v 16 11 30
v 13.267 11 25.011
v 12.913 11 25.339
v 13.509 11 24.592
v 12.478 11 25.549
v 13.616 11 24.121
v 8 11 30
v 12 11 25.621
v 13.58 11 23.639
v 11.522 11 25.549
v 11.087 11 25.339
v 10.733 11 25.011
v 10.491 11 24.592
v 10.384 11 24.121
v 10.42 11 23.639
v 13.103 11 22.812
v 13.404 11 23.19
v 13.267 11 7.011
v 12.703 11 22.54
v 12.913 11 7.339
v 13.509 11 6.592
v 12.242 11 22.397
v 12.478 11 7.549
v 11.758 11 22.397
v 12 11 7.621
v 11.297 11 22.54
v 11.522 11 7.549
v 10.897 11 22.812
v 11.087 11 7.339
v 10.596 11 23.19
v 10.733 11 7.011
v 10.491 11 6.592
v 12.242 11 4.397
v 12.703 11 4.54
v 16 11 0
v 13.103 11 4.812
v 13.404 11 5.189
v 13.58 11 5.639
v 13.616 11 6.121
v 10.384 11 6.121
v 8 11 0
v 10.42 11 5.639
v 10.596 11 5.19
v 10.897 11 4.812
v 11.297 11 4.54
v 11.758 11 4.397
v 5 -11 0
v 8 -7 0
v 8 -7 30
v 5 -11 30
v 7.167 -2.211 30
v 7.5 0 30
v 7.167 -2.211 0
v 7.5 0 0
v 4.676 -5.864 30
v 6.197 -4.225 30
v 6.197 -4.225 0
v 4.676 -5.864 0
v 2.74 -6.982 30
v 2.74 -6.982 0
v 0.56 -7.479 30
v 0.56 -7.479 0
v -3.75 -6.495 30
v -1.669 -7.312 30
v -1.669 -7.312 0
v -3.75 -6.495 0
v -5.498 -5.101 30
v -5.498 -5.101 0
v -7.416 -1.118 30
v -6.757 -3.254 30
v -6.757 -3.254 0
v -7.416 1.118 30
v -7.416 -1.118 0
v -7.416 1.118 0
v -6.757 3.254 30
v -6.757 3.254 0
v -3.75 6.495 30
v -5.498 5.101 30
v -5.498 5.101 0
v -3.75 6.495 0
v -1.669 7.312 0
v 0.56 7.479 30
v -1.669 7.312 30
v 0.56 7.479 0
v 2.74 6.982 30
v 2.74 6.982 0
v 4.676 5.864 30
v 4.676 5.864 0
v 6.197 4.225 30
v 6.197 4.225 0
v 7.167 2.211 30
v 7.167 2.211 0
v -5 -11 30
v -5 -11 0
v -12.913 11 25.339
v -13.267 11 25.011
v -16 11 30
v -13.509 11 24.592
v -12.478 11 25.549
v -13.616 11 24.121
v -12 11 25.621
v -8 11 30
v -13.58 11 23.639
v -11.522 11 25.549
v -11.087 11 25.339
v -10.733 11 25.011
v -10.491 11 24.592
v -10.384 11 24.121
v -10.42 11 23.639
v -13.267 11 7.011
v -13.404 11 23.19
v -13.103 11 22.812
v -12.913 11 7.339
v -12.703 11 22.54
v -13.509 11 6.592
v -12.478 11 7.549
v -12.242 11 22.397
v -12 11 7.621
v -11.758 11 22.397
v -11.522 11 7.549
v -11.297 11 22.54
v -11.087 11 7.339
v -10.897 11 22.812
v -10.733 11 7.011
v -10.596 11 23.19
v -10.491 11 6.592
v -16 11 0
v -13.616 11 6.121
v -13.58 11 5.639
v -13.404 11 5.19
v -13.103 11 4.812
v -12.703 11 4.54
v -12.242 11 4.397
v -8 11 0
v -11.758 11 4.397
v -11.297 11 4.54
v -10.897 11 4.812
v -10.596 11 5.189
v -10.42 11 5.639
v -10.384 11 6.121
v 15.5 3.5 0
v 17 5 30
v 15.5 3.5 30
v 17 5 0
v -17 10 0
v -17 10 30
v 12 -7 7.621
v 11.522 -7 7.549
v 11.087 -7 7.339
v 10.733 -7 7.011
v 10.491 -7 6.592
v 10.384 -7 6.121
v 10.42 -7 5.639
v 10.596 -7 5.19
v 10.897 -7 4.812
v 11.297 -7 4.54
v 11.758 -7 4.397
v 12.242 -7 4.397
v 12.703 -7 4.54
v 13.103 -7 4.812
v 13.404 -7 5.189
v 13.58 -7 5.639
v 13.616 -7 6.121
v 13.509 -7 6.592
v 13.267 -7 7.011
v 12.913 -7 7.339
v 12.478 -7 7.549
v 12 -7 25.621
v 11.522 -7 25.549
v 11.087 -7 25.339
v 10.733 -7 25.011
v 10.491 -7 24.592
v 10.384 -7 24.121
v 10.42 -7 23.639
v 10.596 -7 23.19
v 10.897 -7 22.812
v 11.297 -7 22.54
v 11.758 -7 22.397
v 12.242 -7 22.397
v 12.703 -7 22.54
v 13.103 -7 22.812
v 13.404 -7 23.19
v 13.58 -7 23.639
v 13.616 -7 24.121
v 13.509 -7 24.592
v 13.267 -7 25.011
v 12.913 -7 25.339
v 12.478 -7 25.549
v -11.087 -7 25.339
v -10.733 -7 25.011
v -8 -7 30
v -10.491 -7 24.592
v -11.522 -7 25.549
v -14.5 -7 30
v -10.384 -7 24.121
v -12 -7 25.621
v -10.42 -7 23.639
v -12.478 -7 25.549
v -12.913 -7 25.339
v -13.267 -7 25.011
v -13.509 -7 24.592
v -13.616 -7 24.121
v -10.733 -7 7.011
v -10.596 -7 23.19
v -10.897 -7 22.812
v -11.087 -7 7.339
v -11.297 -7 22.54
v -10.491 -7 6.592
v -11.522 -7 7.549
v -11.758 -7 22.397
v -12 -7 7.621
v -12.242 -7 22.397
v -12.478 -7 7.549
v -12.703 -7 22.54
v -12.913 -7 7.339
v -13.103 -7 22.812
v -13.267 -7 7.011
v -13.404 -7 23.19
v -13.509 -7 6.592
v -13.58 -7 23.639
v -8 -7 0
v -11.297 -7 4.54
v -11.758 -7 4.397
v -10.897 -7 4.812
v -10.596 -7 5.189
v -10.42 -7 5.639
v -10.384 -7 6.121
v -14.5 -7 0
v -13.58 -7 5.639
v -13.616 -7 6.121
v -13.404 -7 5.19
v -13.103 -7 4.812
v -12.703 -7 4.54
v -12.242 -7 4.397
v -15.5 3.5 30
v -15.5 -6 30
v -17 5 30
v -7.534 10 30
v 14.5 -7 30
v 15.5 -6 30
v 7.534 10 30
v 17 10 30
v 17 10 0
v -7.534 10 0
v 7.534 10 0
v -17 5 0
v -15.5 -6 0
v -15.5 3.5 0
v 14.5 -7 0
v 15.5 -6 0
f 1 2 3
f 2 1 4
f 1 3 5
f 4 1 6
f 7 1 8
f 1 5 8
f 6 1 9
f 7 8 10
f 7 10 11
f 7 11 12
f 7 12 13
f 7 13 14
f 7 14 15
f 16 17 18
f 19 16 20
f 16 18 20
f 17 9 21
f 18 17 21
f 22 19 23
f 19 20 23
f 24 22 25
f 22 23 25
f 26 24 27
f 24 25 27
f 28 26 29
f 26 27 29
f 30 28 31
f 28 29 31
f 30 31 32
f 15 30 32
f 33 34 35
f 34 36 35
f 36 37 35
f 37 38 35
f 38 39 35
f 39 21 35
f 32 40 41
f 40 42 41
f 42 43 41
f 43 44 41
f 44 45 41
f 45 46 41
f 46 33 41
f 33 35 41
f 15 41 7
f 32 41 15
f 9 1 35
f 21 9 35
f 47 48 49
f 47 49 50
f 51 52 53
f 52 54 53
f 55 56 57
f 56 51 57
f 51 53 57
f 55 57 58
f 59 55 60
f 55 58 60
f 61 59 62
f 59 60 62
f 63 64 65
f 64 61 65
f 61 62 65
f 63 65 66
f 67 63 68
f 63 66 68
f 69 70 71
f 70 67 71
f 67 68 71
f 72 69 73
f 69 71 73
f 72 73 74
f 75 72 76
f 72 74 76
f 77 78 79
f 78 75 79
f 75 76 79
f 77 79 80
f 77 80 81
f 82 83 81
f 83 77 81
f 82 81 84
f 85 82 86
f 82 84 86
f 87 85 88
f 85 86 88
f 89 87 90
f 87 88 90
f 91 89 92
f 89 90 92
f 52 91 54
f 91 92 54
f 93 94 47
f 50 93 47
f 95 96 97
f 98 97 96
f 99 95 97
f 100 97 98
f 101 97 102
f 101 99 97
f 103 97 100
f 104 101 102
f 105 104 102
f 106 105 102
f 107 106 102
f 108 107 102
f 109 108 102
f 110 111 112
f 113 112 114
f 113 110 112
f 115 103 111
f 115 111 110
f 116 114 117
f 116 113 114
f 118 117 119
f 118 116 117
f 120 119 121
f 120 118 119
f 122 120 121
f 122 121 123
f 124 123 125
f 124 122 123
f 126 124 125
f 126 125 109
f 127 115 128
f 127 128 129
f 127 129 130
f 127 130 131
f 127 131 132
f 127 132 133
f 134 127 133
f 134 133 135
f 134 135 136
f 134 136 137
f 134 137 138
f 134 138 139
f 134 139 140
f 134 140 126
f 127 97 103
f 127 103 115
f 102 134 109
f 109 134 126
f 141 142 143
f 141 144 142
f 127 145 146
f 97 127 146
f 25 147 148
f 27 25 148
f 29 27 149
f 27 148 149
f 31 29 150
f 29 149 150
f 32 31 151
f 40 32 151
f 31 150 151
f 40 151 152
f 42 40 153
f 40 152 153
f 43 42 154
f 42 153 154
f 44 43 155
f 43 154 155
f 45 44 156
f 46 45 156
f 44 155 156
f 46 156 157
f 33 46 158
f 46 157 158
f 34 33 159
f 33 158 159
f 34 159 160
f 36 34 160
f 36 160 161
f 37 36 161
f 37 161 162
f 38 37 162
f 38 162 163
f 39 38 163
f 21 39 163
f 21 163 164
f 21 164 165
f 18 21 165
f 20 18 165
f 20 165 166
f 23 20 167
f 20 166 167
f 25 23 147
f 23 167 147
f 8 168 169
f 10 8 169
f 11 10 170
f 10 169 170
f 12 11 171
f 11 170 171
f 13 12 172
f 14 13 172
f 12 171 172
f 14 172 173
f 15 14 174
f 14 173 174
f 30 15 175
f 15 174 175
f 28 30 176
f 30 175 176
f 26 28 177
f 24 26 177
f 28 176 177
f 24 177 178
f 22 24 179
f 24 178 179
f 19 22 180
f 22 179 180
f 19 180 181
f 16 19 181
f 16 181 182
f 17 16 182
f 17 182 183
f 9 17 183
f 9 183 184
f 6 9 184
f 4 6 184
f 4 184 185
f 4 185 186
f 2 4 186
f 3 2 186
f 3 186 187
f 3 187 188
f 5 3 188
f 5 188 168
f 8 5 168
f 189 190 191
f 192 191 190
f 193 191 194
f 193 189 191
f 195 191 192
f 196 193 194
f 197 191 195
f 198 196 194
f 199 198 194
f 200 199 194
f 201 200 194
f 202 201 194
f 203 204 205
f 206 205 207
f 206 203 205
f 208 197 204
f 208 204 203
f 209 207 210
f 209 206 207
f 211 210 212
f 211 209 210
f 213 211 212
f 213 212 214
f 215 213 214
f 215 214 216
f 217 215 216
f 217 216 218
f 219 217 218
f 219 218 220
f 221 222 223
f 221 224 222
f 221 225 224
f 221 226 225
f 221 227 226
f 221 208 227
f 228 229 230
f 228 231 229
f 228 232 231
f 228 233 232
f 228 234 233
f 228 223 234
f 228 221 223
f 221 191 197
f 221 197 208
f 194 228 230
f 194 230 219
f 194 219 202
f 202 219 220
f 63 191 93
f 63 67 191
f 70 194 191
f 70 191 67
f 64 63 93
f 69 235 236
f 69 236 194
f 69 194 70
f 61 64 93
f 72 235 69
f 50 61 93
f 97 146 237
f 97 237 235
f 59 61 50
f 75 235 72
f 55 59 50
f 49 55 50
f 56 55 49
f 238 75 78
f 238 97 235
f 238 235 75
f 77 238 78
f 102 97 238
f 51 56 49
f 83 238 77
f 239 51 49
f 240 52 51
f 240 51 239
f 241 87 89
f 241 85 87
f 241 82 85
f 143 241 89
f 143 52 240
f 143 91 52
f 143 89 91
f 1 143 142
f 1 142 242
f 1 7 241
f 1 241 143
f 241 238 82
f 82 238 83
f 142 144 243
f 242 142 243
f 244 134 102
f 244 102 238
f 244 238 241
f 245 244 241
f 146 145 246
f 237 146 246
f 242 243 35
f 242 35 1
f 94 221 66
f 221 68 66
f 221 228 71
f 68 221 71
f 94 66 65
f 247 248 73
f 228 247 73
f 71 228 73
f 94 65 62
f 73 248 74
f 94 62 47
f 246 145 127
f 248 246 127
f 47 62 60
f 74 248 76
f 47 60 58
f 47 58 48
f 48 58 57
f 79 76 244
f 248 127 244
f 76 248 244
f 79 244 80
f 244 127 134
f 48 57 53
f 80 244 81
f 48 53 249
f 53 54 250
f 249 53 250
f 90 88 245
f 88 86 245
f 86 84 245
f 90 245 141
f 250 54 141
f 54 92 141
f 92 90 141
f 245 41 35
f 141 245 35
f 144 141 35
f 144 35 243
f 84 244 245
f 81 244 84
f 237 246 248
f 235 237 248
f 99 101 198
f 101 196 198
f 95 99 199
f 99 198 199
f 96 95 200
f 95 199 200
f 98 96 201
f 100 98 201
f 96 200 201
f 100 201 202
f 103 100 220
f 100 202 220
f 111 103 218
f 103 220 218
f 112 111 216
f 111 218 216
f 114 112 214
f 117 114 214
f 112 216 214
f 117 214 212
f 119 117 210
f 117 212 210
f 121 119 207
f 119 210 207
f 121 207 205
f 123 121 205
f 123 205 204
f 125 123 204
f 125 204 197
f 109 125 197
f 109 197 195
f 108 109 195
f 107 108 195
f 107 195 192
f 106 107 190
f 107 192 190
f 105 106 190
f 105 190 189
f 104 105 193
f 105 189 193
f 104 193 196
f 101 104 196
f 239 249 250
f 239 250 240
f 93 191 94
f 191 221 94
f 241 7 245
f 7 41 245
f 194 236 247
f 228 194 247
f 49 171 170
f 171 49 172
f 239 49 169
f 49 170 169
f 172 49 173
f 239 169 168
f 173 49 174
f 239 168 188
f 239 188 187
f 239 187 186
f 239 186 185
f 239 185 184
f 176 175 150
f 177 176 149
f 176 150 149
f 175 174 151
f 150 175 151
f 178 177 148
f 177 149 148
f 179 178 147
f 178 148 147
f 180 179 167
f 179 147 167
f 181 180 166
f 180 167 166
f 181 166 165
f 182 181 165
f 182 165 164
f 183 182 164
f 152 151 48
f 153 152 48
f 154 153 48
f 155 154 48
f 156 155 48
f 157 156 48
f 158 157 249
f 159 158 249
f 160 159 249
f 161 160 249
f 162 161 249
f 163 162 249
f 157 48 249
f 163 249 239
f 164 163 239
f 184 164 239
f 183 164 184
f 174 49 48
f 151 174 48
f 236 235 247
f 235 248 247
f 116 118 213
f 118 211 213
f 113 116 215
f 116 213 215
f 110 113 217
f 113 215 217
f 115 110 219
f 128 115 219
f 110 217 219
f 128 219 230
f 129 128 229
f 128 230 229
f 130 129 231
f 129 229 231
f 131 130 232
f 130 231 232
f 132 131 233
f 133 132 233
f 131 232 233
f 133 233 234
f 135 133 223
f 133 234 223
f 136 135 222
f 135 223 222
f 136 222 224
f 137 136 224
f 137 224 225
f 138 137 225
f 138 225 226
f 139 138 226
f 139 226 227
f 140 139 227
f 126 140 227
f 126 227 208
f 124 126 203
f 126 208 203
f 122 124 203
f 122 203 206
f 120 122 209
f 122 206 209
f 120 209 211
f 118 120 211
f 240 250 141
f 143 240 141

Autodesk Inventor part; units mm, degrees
ref_plane "YZ Plane" through (0, 0, 0) normal (1, 0, 0) x (0, 1, 0)
ref_plane "XZ Plane" through (0, 0, 0) normal (0, 1, 0) x (-1, 0, 0)
ref_plane "XY Plane" through (0, 0, 0) normal (0, 0, 1) x (1, 0, 0)
sketch "Esboço1" plane through (0, 0, 0) normal (0, 0, 1) x (1, 0, 0)
  line L0 (-17, 11) -> (17, 11) construction
  line L1 (17, 11) -> (17, -7) construction
  line L2 (17, -7) -> (-17, -7) construction
  line L3 (-17, -7) -> (-17, 11) construction
  line L4 (-14, 20.4248) -> (-14, -25.3484) construction
  line L5 (14, 20.4248) -> (14, -25.3484) construction
  line L6 (0, 20.9223) -> (0, -24.8509) construction
  line L7 (-26.3196, 0) -> (26.3196, 0) construction
  line L8 (-26.3196, 5) -> (26.3196, 5) construction
  line L9 (-15.5, 15.1736) -> (-15.5, -30.5996) construction
  line L10 (15.5, 20.4248) -> (15.5, -25.3484) construction
  line L11 (0, 0) -> (-21.4941, -25.6157) construction
  line L12 (0, 0) -> (11.7474, -14) construction
  line L13 (-8, 20.4248) -> (-8, -25.3484) construction
  line L14 (-5, 20.4248) -> (-5, -25.3484) construction
  line L15 (5, 20.9223) -> (5, -24.8509) construction
  line L16 (8, 20.9223) -> (8, -24.8509) construction
  line L17 (-26.3196, 3.5) -> (26.3196, 3.5) construction
  line L18 (-17, 11) -> (-17, 5)
  line L19 (-17, 5) -> (-15.5, 3.5)
  line L20 (-15.5, 3.5) -> (-15.5, -7)
  line L21 (17, 5) -> (17, 11)
  line L22 (26.3196, 10) -> (-26.3196, 10) construction
  line L23 (-17, 11) -> (-8, 11)
  line L24 (17, 11) -> (8, 11)
  line L25 (-8, 11) -> (-7.6714, 11) construction
  line L26 (-8, 11) -> (-7.5337, 10)
  line L27 (-8, 11) -> (-6.8966, 11) construction
  line L28 (-5, 11) -> (-3.8966, 11) construction
  line L29 (8, 11) -> (7.5337, 10)
  line L30 (15.5, -7) -> (15.5, 3.5)
  line L31 (17, 5) -> (15.5, 3.5)
  line L32 (-26.3196, -11) -> (26.3196, -11) construction
  line L33 (-7.5337, 10) -> (7.5337, 10)
  line L34 (-8, -7) -> (-5, -11)
  line L35 (8, -7) -> (5, -11)
  line L36 (-5, -11) -> (5, -11)
  line L37 (-8, -7) -> (-15.5, -7)
  line L38 (8, -7) -> (15.5, -7)
  circle A0 centre (0, 0) radius 7.5
  point P0 (0, 11)
  point P1 (0, 5)
  point P2 (0, -11)
  dimension "d0" = 34
  dimension "d1" = 18
  dimension "d2" = 14
  dimension "d3" = 14
  dimension "d4" = 11
  dimension "d5" = 6
  dimension "d6" = 1.5
  dimension "d7" = 1.5
  dimension "d8" = 40
  dimension "d9" = 40
  dimension "d10" = 5
  dimension "d11" = 5
  dimension "d12" = 8
  dimension "d13" = 8
  dimension "d14" = 1.5
  dimension "d15" = 1
  dimension "d18" = 115
  dimension "d20" = 115
  dimension "d21" = 22
  dimension "d22" = 15
extrude "Extrusão1" add sketch "Esboço1" along normal blind 30
sketch "Esboço2" plane through (-17, 11, 0) normal (0, 1, 0) x (1, 0, 0)
  line L0 (0, 0) -> (0, -30) construction
  line L1 (0, -15) -> (34, -15) construction
  line L2 (34, 0) -> (34, -30) construction
  line L3 (17, 0) -> (17, -29.9375) construction
  circle A0 centre (5, -24) radius 1 construction
  circle A1 centre (5, -6) radius 1 construction
  circle A2 centre (29, -6) radius 1 construction
  circle A3 centre (29, -24) radius 1 construction
  dimension "d25" = 2
  dimension "d26" = 2
  dimension "d27" = 2
  dimension "d28" = 2
  dimension "d29" = 9
  dimension "d30" = 9
  dimension "d31" = 9
  dimension "d32" = 9
  dimension "d33" = 12
  dimension "d34" = 12
  dimension "d35" = 12
  dimension "d36" = 12
hole "Furo1" at (-12, 11, 24) at (12, 11, 24) at (12, 11, 6) at (-12, 11, 6) direction (0, -1, 0) diameter 3.242 end through all thread size "M4x0.7" class "6H" standard "ANSI Metric M Profile"
chamfer "Chanfro1" distance 1 angle 45 4 edges at (-17, 11, 15) (17, 11, 15) (15.5, -7, 15) (-15.5, -7, 15)
equation "\"d3\" = d2"
equation "\"d7\" = d6"
equation "\"d9\" = d8"
equation "\"d11\" = d10"
equation "\"d13\" = d12"
equation "\"d26\" = d25"
equation "\"d27\" = d25"
equation "\"d28\" = d25"
equation "\"d30\" = d29"
equation "\"d31\" = d29"
equation "\"d32\" = d29"
equation "\"d34\" = d33"
equation "\"d35\" = d33"
equation "\"d36\" = d33"
properties part number "PilowBlockFechadoSCS8UU"
